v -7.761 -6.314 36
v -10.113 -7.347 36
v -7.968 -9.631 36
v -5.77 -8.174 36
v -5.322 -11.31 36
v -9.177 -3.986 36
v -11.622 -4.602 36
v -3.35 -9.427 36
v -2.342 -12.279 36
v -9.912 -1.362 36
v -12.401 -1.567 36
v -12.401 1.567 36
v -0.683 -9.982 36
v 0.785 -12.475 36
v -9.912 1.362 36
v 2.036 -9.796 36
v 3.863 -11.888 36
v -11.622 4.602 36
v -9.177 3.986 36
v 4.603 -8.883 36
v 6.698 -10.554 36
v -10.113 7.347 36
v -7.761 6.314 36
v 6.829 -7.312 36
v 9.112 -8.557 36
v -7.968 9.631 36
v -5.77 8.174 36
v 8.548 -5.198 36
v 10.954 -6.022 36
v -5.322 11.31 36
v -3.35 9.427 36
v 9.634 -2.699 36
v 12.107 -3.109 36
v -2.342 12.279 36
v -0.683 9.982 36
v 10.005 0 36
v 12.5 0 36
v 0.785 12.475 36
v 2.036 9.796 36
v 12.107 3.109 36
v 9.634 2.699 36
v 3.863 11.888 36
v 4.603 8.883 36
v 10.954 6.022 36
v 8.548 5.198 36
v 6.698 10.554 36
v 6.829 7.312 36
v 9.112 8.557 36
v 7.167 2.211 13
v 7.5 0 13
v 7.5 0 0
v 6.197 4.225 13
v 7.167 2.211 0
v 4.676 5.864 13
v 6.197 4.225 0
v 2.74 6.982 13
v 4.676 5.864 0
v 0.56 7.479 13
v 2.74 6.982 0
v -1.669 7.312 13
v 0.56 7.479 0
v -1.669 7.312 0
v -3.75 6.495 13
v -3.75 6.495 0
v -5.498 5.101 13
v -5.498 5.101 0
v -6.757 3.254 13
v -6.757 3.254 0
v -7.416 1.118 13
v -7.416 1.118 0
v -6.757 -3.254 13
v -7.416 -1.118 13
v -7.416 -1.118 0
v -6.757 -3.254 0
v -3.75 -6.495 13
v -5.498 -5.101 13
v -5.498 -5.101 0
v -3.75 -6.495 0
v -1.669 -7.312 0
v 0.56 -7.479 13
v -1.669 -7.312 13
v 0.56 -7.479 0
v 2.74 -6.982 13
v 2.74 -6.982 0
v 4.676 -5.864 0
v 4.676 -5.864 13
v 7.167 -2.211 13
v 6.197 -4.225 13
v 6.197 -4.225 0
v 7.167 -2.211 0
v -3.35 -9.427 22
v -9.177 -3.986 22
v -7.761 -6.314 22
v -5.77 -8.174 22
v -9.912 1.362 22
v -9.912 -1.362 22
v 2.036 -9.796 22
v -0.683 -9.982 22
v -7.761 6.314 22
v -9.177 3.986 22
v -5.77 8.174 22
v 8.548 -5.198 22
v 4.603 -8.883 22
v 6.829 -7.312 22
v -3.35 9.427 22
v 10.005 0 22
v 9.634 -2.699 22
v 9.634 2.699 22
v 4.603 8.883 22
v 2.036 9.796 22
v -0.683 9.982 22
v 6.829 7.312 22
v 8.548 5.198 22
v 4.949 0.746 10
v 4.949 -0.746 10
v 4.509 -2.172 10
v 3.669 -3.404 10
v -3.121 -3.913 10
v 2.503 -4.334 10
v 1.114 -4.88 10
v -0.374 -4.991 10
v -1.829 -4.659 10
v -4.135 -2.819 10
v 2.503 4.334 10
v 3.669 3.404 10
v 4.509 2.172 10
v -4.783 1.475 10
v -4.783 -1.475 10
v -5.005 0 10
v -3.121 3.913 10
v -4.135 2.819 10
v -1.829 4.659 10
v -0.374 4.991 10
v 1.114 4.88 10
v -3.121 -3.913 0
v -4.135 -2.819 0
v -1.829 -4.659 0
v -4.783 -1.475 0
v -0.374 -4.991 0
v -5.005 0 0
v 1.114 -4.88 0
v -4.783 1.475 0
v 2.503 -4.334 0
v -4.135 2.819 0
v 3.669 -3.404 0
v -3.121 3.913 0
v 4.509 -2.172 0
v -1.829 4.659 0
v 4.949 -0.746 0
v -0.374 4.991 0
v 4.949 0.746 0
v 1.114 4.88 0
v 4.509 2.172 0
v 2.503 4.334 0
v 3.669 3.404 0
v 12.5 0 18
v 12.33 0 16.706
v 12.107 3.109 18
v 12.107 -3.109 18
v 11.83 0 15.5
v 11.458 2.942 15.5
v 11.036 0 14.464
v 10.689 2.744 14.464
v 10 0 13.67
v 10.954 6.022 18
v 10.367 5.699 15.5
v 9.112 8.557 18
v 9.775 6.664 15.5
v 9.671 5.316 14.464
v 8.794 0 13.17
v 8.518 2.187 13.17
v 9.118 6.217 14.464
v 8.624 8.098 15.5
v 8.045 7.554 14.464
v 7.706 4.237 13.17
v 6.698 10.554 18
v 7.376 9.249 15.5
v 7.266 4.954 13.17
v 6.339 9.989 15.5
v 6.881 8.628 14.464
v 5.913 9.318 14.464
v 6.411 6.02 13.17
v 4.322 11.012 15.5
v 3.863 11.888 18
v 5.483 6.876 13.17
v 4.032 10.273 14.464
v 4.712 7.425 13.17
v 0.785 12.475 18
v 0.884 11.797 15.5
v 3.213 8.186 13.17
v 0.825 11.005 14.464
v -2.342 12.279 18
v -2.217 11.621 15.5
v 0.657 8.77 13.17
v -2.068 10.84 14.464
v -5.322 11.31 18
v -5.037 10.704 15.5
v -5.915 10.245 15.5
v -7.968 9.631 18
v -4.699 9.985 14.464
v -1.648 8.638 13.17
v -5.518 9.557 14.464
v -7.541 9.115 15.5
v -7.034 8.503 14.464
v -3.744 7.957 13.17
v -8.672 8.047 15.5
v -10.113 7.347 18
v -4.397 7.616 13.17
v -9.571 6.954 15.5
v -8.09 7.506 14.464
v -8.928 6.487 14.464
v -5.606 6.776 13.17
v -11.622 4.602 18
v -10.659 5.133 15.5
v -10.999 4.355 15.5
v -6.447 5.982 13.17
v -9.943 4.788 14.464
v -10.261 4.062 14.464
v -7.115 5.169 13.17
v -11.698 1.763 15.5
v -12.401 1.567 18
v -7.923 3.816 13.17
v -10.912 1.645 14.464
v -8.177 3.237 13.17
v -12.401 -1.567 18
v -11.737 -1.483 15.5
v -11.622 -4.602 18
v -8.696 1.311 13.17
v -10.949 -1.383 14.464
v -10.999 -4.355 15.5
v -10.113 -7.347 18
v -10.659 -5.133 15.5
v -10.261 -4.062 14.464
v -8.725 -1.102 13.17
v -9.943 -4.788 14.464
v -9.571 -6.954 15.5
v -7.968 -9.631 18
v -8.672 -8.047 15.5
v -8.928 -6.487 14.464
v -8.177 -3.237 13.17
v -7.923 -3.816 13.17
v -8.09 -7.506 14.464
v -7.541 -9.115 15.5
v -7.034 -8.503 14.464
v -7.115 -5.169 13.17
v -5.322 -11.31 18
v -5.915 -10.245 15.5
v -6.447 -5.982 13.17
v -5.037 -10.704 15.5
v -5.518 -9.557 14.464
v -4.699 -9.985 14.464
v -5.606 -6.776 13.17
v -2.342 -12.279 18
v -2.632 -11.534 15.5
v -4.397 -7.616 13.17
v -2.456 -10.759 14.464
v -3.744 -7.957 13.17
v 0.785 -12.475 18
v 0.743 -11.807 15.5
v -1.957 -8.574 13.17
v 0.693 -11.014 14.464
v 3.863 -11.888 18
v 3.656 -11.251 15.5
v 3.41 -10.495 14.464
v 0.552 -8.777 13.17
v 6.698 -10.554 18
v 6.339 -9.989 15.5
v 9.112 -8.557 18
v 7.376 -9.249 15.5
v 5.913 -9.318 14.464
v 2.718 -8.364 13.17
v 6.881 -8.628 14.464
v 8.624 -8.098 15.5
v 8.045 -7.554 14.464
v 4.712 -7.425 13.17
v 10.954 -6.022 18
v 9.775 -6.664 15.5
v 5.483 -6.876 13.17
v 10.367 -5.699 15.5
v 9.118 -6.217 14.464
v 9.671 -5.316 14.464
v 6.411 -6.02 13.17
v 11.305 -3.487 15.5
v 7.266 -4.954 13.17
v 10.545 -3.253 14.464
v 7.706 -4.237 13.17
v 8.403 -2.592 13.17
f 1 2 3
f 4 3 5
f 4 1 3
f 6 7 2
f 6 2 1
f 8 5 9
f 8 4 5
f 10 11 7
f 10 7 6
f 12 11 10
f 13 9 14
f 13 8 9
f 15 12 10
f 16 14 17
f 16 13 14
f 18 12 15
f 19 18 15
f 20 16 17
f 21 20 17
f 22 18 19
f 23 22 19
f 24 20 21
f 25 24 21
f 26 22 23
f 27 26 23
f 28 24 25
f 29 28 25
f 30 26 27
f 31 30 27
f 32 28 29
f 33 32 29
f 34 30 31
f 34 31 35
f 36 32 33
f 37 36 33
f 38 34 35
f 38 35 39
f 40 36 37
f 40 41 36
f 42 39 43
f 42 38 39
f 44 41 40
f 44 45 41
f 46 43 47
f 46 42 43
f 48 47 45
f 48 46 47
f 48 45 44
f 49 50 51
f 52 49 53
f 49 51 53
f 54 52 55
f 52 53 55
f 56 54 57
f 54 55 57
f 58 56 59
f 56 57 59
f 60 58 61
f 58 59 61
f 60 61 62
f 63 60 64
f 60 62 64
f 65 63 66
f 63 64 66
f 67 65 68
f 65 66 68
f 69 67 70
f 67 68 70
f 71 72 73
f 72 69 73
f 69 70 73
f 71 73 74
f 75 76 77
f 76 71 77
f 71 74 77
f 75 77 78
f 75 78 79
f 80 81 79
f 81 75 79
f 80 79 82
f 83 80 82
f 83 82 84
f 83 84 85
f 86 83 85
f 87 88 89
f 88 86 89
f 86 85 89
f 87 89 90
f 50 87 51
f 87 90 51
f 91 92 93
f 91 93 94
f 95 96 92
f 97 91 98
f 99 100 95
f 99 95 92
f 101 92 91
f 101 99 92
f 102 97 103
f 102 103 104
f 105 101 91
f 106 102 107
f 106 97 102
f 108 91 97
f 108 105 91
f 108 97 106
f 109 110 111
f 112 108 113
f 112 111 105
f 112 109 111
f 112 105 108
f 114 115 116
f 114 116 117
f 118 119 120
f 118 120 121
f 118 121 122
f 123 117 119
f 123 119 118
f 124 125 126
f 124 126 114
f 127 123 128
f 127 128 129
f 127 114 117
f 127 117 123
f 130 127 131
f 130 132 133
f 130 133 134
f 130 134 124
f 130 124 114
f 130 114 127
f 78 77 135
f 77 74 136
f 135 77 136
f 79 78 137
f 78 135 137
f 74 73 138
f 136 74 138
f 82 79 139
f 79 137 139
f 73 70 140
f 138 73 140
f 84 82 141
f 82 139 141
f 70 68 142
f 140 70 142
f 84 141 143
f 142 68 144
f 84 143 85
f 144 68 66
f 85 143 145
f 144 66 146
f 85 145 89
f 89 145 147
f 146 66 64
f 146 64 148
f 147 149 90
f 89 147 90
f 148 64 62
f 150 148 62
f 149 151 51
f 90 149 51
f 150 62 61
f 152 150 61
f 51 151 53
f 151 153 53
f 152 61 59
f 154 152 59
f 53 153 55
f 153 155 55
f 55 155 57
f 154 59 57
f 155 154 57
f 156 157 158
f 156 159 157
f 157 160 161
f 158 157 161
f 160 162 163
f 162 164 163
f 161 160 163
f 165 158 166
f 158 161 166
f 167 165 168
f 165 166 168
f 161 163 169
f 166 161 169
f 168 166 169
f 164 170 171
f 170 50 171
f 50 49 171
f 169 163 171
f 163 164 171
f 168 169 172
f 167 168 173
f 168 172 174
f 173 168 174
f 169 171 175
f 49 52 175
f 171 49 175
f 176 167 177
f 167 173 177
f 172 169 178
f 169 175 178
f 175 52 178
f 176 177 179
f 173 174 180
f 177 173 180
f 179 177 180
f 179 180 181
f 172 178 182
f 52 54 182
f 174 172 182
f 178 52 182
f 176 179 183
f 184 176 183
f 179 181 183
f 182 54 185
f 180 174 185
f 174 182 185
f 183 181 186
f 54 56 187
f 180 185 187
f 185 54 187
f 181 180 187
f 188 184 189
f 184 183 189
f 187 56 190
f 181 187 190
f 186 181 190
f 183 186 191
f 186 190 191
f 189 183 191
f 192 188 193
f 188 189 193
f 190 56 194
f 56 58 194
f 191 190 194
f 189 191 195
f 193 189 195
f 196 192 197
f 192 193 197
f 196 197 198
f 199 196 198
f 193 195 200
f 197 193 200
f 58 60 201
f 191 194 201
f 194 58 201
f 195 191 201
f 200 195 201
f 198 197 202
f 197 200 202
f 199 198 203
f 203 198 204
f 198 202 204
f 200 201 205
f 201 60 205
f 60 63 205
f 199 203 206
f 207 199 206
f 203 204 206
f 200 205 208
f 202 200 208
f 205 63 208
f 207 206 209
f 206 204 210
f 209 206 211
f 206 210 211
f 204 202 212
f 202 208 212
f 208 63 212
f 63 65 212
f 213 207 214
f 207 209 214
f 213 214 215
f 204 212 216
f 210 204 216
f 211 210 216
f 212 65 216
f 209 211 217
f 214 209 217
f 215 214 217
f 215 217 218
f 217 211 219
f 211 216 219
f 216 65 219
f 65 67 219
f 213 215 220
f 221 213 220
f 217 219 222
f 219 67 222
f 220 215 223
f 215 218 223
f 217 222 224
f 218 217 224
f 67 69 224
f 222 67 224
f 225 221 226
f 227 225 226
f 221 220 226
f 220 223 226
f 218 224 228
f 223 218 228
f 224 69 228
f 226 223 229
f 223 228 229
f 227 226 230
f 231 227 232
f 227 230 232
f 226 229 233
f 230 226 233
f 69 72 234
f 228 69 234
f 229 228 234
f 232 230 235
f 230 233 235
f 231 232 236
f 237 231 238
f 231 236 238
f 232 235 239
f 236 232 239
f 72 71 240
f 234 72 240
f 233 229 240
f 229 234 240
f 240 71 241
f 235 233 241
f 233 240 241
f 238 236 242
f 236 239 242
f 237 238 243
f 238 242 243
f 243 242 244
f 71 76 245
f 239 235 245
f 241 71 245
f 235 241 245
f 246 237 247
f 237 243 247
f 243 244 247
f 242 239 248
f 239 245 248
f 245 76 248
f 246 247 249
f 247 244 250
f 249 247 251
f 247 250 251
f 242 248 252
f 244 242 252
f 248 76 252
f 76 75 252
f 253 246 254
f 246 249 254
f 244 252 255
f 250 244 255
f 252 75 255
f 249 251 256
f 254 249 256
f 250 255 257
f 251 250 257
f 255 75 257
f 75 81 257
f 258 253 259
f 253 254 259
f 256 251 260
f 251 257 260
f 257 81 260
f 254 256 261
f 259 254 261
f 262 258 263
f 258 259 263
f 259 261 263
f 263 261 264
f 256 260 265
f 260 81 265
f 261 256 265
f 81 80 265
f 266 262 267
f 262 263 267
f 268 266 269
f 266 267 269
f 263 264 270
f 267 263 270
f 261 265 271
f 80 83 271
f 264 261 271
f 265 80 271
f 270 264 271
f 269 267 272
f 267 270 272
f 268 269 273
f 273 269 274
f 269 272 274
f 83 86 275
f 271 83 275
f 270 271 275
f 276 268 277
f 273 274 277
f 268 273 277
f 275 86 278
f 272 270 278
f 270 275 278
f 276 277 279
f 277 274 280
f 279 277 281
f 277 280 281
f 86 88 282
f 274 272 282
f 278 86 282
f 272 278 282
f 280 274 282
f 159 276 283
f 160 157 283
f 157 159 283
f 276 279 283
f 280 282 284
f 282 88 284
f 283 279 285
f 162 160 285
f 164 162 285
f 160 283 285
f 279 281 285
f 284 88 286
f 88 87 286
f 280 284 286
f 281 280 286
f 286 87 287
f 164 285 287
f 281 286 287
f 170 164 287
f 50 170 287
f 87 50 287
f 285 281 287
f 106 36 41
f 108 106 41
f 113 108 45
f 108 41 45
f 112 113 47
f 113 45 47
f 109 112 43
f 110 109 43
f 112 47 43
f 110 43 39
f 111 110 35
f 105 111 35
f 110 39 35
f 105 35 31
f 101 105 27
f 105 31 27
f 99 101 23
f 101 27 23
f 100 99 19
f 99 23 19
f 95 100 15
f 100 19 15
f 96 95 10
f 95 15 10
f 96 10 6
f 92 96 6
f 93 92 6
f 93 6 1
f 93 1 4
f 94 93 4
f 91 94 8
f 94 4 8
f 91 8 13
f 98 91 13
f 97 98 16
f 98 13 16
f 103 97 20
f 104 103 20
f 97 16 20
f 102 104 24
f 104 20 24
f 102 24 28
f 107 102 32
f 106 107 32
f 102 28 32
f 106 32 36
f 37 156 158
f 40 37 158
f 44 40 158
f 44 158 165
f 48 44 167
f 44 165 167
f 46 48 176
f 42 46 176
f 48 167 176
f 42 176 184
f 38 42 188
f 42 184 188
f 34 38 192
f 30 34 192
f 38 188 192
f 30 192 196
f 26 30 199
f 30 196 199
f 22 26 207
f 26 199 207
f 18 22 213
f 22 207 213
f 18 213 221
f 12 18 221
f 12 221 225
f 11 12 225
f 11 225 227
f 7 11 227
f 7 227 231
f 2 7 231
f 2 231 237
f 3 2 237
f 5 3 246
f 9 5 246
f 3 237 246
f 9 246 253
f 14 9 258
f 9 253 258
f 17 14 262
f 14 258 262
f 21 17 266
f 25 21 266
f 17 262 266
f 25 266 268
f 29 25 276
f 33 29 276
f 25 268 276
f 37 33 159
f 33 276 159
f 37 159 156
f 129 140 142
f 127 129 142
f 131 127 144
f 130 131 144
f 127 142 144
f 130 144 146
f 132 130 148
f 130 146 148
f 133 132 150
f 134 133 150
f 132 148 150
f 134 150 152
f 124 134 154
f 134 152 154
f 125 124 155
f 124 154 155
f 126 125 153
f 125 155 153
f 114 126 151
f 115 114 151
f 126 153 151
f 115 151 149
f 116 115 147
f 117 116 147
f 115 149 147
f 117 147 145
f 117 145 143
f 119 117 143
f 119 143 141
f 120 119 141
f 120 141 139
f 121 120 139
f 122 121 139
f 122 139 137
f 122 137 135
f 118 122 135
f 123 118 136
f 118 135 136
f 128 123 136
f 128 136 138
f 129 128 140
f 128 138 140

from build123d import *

# Parameters (mm, degrees)
SKETCH1_R                = 7.5
BOSS_EXTRUDE1_DEPTH      = 16
BOSS_EXTRUDE2_DEPTH      = 16
BOSS_EXTRUDE2_DEPTH_BACK = 7
SKETCH2_R                = 12.5
FILLET1_R                = 5
SKETCH4_R                = 10.005
CUT_EXTRUDE1_DEPTH       = 14
SKETCH3_R                = 5.005
CUT_EXTRUDE2_DEPTH       = 10


with BuildPart() as part:
    # Sketch1 → Boss-Extrude1 (new body)
    with BuildSketch(Plane.XY):
        Circle(SKETCH1_R)
    extrude(amount=BOSS_EXTRUDE1_DEPTH)

    # Sketch2 → Boss-Extrude2 (add, two sides: drawn at the far end of the back side and taken through both)
    with BuildSketch(Plane.XY.offset(20).offset(-BOSS_EXTRUDE2_DEPTH_BACK)):
        Circle(SKETCH2_R)
    extrude(amount=BOSS_EXTRUDE2_DEPTH + BOSS_EXTRUDE2_DEPTH_BACK)

    # Fillet1
    fillet1_edges = [part.edges().sort_by_distance(p)[0] for p in [
        (-12.5, 0, 13),
    ]]
    fillet(fillet1_edges, radius=FILLET1_R - 0.0001)  # a hair under: the kernel refuses the full size

    # Sketch4 → Cut-Extrude1 (cut)
    with BuildSketch(Plane.XY.offset(36)):
        Circle(SKETCH4_R)
    extrude(amount=-CUT_EXTRUDE1_DEPTH, mode=Mode.SUBTRACT)

    # Sketch3 → Cut-Extrude2 (cut)
    with BuildSketch(Plane(origin=(0, 0, 0), x_dir=(-1, 0, 0), z_dir=(0, 0, -1))):
        Circle(SKETCH3_R)
    extrude(amount=-CUT_EXTRUDE2_DEPTH, mode=Mode.SUBTRACT)


solid = part.part
